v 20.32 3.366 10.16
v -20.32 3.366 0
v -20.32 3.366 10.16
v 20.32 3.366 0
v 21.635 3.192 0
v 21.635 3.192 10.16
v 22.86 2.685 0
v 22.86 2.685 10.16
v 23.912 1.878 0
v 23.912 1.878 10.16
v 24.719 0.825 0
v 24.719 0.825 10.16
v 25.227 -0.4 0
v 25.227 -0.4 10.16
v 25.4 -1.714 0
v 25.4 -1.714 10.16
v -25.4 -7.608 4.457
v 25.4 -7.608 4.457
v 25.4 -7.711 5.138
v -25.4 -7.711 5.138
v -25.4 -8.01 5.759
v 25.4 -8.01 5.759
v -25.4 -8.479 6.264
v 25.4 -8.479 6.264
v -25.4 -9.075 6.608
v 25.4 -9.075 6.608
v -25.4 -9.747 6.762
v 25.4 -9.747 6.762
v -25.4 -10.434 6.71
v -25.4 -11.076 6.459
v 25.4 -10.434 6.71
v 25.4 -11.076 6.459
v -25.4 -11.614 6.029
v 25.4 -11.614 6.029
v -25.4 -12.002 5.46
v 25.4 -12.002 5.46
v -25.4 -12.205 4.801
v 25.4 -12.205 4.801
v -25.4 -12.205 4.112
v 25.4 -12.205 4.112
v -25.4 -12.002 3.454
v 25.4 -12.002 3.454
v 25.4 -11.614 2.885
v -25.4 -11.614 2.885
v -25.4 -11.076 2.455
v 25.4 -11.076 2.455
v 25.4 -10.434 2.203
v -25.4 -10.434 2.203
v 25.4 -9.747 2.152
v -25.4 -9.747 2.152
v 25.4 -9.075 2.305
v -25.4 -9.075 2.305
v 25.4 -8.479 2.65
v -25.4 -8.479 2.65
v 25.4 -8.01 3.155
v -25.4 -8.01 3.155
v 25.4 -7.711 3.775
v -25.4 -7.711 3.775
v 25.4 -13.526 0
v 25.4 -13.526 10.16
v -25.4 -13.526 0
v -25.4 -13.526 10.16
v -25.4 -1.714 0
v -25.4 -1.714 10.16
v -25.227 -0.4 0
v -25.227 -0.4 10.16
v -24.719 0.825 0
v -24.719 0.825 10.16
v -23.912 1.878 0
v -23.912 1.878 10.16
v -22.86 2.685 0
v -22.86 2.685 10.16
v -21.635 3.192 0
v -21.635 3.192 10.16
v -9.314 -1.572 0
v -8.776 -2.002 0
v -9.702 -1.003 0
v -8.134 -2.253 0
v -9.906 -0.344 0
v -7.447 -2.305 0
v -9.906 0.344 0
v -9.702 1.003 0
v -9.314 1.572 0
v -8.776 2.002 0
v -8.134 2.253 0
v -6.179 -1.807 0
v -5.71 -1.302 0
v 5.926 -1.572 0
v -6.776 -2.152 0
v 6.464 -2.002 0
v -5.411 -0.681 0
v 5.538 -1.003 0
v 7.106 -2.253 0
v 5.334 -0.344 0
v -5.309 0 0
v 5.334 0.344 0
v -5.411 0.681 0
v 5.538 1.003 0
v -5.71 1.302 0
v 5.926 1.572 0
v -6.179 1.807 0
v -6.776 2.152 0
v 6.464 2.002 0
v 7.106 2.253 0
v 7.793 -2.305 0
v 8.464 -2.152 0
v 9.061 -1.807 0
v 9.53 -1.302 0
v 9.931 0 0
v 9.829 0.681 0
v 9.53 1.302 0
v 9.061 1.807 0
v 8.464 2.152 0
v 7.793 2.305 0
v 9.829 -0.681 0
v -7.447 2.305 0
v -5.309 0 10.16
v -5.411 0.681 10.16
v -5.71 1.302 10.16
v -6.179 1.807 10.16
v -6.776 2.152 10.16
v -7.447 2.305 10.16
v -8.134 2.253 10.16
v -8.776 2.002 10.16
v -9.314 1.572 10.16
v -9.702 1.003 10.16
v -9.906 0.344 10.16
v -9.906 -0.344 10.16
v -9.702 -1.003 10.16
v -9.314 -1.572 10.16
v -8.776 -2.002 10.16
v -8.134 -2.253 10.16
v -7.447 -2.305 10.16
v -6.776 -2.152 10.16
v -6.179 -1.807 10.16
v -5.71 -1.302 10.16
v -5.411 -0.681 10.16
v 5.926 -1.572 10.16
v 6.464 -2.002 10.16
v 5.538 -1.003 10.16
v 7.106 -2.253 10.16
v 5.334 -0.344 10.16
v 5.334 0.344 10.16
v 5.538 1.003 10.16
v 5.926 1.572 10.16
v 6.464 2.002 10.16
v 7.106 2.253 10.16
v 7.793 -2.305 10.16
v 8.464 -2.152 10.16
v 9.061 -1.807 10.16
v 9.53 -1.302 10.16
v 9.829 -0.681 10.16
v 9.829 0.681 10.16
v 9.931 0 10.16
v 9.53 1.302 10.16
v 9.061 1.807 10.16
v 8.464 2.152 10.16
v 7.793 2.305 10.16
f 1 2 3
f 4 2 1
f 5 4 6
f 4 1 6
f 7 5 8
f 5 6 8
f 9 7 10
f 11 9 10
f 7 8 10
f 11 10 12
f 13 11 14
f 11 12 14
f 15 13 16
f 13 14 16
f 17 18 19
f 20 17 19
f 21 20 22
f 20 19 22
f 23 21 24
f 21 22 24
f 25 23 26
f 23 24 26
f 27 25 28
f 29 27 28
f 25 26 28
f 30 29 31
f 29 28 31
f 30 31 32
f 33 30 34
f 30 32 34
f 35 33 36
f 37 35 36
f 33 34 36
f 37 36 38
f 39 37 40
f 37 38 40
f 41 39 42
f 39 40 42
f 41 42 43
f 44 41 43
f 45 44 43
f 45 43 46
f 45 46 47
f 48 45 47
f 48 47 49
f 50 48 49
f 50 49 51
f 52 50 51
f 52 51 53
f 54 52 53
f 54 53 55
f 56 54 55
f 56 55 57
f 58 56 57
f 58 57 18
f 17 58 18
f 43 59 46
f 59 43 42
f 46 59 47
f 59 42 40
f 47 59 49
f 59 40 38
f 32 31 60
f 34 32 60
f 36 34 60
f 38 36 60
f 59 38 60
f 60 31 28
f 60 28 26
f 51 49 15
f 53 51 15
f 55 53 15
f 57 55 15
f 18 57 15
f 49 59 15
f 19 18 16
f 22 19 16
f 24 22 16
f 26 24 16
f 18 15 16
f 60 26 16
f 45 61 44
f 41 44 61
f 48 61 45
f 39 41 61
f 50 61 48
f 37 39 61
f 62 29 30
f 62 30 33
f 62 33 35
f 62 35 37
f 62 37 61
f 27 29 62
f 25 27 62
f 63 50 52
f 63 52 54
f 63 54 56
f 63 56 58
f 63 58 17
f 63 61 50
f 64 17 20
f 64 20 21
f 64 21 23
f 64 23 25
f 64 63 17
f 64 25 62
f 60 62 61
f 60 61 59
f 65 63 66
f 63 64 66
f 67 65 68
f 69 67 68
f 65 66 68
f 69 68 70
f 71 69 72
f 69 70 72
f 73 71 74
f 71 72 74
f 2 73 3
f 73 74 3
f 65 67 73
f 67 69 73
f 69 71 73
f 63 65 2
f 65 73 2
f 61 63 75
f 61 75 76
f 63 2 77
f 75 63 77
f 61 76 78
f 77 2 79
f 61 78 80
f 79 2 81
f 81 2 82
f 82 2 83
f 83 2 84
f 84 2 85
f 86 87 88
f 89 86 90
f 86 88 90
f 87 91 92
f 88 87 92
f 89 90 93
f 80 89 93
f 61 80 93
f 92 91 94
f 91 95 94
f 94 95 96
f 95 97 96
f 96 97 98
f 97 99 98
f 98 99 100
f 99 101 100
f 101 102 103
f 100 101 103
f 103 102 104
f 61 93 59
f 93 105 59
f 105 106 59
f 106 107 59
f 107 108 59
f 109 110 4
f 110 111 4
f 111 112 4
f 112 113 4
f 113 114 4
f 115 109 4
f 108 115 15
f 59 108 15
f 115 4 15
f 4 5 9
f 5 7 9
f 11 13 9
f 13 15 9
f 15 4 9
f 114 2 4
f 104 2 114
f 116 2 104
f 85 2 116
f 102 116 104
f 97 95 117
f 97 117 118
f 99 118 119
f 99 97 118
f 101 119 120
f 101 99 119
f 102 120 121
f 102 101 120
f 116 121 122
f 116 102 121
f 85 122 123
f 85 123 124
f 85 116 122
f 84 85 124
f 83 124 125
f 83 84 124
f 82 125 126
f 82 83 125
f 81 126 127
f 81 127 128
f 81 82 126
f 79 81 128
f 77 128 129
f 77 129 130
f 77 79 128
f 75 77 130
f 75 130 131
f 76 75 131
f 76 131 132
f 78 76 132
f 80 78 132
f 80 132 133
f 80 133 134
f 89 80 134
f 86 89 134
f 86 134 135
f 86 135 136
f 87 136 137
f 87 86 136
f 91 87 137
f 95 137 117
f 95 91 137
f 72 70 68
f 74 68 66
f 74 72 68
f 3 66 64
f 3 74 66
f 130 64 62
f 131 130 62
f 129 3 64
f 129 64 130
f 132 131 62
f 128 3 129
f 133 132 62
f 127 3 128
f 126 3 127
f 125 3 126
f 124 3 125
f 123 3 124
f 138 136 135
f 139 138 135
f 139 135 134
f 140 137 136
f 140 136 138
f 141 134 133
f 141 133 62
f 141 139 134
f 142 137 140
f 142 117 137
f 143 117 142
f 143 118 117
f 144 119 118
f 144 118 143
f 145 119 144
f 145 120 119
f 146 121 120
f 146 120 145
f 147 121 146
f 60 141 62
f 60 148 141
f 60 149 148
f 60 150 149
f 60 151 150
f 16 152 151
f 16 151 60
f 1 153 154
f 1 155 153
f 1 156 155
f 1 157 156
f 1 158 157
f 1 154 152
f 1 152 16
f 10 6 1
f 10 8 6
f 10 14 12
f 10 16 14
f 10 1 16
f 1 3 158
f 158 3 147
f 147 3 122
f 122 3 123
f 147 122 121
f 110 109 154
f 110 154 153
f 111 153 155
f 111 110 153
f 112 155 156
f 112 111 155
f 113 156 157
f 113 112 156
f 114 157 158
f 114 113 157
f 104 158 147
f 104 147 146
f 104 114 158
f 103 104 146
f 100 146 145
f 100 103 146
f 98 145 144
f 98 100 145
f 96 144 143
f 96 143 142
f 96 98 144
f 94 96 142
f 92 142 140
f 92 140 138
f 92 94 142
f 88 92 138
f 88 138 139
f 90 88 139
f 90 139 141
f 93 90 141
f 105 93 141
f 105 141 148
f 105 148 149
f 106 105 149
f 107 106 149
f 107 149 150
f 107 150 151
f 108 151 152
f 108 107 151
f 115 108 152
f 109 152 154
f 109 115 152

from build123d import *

# Parameters (mm, degrees)
F0_W     = 50.8
F0_H     = 6.731
F0_R     = 2.3114
F1_DEPTH = 10.16
F3_W     = 50.8
F3_H     = 10.16
F4_DEPTH = 10.16
F5_R     = 2.3114
F6_DEPTH = 70.36535
F7_R     = 5.08


with BuildPart() as f1:
    # F0 (on Top) → F1 (new body)
    with BuildSketch(Plane.XY):
        Rectangle(F0_W, F0_H)
        with Locations((-7.62, 0)):
            Circle(F0_R, mode=Mode.SUBTRACT)
        with Locations((7.62, 0)):
            Circle(F0_R, mode=Mode.SUBTRACT)
    extrude(amount=F1_DEPTH)

    # F3 (on face) → F4 (join)
    with BuildSketch(Plane.XZ.offset(3.3655)):
        with Locations((0, 5.08)):
            Rectangle(F3_W, F3_H)
    extrude(amount=F4_DEPTH)

    # F5 (on face) → F6 (cut)
    with BuildSketch(Plane.YZ.offset(25.4)):
        with Locations((-9.919893, 4.456782)):
            Circle(F5_R)
    extrude(amount=-F6_DEPTH, mode=Mode.SUBTRACT)

    # F7
    f7_edges = [f1.edges().sort_by_distance(p)[0] for p in [
        (-25.4, 3.3655, 5.08),
        (25.4, 3.3655, 5.08),
    ]]
    fillet(f7_edges, radius=F7_R)


solid = f1.part
